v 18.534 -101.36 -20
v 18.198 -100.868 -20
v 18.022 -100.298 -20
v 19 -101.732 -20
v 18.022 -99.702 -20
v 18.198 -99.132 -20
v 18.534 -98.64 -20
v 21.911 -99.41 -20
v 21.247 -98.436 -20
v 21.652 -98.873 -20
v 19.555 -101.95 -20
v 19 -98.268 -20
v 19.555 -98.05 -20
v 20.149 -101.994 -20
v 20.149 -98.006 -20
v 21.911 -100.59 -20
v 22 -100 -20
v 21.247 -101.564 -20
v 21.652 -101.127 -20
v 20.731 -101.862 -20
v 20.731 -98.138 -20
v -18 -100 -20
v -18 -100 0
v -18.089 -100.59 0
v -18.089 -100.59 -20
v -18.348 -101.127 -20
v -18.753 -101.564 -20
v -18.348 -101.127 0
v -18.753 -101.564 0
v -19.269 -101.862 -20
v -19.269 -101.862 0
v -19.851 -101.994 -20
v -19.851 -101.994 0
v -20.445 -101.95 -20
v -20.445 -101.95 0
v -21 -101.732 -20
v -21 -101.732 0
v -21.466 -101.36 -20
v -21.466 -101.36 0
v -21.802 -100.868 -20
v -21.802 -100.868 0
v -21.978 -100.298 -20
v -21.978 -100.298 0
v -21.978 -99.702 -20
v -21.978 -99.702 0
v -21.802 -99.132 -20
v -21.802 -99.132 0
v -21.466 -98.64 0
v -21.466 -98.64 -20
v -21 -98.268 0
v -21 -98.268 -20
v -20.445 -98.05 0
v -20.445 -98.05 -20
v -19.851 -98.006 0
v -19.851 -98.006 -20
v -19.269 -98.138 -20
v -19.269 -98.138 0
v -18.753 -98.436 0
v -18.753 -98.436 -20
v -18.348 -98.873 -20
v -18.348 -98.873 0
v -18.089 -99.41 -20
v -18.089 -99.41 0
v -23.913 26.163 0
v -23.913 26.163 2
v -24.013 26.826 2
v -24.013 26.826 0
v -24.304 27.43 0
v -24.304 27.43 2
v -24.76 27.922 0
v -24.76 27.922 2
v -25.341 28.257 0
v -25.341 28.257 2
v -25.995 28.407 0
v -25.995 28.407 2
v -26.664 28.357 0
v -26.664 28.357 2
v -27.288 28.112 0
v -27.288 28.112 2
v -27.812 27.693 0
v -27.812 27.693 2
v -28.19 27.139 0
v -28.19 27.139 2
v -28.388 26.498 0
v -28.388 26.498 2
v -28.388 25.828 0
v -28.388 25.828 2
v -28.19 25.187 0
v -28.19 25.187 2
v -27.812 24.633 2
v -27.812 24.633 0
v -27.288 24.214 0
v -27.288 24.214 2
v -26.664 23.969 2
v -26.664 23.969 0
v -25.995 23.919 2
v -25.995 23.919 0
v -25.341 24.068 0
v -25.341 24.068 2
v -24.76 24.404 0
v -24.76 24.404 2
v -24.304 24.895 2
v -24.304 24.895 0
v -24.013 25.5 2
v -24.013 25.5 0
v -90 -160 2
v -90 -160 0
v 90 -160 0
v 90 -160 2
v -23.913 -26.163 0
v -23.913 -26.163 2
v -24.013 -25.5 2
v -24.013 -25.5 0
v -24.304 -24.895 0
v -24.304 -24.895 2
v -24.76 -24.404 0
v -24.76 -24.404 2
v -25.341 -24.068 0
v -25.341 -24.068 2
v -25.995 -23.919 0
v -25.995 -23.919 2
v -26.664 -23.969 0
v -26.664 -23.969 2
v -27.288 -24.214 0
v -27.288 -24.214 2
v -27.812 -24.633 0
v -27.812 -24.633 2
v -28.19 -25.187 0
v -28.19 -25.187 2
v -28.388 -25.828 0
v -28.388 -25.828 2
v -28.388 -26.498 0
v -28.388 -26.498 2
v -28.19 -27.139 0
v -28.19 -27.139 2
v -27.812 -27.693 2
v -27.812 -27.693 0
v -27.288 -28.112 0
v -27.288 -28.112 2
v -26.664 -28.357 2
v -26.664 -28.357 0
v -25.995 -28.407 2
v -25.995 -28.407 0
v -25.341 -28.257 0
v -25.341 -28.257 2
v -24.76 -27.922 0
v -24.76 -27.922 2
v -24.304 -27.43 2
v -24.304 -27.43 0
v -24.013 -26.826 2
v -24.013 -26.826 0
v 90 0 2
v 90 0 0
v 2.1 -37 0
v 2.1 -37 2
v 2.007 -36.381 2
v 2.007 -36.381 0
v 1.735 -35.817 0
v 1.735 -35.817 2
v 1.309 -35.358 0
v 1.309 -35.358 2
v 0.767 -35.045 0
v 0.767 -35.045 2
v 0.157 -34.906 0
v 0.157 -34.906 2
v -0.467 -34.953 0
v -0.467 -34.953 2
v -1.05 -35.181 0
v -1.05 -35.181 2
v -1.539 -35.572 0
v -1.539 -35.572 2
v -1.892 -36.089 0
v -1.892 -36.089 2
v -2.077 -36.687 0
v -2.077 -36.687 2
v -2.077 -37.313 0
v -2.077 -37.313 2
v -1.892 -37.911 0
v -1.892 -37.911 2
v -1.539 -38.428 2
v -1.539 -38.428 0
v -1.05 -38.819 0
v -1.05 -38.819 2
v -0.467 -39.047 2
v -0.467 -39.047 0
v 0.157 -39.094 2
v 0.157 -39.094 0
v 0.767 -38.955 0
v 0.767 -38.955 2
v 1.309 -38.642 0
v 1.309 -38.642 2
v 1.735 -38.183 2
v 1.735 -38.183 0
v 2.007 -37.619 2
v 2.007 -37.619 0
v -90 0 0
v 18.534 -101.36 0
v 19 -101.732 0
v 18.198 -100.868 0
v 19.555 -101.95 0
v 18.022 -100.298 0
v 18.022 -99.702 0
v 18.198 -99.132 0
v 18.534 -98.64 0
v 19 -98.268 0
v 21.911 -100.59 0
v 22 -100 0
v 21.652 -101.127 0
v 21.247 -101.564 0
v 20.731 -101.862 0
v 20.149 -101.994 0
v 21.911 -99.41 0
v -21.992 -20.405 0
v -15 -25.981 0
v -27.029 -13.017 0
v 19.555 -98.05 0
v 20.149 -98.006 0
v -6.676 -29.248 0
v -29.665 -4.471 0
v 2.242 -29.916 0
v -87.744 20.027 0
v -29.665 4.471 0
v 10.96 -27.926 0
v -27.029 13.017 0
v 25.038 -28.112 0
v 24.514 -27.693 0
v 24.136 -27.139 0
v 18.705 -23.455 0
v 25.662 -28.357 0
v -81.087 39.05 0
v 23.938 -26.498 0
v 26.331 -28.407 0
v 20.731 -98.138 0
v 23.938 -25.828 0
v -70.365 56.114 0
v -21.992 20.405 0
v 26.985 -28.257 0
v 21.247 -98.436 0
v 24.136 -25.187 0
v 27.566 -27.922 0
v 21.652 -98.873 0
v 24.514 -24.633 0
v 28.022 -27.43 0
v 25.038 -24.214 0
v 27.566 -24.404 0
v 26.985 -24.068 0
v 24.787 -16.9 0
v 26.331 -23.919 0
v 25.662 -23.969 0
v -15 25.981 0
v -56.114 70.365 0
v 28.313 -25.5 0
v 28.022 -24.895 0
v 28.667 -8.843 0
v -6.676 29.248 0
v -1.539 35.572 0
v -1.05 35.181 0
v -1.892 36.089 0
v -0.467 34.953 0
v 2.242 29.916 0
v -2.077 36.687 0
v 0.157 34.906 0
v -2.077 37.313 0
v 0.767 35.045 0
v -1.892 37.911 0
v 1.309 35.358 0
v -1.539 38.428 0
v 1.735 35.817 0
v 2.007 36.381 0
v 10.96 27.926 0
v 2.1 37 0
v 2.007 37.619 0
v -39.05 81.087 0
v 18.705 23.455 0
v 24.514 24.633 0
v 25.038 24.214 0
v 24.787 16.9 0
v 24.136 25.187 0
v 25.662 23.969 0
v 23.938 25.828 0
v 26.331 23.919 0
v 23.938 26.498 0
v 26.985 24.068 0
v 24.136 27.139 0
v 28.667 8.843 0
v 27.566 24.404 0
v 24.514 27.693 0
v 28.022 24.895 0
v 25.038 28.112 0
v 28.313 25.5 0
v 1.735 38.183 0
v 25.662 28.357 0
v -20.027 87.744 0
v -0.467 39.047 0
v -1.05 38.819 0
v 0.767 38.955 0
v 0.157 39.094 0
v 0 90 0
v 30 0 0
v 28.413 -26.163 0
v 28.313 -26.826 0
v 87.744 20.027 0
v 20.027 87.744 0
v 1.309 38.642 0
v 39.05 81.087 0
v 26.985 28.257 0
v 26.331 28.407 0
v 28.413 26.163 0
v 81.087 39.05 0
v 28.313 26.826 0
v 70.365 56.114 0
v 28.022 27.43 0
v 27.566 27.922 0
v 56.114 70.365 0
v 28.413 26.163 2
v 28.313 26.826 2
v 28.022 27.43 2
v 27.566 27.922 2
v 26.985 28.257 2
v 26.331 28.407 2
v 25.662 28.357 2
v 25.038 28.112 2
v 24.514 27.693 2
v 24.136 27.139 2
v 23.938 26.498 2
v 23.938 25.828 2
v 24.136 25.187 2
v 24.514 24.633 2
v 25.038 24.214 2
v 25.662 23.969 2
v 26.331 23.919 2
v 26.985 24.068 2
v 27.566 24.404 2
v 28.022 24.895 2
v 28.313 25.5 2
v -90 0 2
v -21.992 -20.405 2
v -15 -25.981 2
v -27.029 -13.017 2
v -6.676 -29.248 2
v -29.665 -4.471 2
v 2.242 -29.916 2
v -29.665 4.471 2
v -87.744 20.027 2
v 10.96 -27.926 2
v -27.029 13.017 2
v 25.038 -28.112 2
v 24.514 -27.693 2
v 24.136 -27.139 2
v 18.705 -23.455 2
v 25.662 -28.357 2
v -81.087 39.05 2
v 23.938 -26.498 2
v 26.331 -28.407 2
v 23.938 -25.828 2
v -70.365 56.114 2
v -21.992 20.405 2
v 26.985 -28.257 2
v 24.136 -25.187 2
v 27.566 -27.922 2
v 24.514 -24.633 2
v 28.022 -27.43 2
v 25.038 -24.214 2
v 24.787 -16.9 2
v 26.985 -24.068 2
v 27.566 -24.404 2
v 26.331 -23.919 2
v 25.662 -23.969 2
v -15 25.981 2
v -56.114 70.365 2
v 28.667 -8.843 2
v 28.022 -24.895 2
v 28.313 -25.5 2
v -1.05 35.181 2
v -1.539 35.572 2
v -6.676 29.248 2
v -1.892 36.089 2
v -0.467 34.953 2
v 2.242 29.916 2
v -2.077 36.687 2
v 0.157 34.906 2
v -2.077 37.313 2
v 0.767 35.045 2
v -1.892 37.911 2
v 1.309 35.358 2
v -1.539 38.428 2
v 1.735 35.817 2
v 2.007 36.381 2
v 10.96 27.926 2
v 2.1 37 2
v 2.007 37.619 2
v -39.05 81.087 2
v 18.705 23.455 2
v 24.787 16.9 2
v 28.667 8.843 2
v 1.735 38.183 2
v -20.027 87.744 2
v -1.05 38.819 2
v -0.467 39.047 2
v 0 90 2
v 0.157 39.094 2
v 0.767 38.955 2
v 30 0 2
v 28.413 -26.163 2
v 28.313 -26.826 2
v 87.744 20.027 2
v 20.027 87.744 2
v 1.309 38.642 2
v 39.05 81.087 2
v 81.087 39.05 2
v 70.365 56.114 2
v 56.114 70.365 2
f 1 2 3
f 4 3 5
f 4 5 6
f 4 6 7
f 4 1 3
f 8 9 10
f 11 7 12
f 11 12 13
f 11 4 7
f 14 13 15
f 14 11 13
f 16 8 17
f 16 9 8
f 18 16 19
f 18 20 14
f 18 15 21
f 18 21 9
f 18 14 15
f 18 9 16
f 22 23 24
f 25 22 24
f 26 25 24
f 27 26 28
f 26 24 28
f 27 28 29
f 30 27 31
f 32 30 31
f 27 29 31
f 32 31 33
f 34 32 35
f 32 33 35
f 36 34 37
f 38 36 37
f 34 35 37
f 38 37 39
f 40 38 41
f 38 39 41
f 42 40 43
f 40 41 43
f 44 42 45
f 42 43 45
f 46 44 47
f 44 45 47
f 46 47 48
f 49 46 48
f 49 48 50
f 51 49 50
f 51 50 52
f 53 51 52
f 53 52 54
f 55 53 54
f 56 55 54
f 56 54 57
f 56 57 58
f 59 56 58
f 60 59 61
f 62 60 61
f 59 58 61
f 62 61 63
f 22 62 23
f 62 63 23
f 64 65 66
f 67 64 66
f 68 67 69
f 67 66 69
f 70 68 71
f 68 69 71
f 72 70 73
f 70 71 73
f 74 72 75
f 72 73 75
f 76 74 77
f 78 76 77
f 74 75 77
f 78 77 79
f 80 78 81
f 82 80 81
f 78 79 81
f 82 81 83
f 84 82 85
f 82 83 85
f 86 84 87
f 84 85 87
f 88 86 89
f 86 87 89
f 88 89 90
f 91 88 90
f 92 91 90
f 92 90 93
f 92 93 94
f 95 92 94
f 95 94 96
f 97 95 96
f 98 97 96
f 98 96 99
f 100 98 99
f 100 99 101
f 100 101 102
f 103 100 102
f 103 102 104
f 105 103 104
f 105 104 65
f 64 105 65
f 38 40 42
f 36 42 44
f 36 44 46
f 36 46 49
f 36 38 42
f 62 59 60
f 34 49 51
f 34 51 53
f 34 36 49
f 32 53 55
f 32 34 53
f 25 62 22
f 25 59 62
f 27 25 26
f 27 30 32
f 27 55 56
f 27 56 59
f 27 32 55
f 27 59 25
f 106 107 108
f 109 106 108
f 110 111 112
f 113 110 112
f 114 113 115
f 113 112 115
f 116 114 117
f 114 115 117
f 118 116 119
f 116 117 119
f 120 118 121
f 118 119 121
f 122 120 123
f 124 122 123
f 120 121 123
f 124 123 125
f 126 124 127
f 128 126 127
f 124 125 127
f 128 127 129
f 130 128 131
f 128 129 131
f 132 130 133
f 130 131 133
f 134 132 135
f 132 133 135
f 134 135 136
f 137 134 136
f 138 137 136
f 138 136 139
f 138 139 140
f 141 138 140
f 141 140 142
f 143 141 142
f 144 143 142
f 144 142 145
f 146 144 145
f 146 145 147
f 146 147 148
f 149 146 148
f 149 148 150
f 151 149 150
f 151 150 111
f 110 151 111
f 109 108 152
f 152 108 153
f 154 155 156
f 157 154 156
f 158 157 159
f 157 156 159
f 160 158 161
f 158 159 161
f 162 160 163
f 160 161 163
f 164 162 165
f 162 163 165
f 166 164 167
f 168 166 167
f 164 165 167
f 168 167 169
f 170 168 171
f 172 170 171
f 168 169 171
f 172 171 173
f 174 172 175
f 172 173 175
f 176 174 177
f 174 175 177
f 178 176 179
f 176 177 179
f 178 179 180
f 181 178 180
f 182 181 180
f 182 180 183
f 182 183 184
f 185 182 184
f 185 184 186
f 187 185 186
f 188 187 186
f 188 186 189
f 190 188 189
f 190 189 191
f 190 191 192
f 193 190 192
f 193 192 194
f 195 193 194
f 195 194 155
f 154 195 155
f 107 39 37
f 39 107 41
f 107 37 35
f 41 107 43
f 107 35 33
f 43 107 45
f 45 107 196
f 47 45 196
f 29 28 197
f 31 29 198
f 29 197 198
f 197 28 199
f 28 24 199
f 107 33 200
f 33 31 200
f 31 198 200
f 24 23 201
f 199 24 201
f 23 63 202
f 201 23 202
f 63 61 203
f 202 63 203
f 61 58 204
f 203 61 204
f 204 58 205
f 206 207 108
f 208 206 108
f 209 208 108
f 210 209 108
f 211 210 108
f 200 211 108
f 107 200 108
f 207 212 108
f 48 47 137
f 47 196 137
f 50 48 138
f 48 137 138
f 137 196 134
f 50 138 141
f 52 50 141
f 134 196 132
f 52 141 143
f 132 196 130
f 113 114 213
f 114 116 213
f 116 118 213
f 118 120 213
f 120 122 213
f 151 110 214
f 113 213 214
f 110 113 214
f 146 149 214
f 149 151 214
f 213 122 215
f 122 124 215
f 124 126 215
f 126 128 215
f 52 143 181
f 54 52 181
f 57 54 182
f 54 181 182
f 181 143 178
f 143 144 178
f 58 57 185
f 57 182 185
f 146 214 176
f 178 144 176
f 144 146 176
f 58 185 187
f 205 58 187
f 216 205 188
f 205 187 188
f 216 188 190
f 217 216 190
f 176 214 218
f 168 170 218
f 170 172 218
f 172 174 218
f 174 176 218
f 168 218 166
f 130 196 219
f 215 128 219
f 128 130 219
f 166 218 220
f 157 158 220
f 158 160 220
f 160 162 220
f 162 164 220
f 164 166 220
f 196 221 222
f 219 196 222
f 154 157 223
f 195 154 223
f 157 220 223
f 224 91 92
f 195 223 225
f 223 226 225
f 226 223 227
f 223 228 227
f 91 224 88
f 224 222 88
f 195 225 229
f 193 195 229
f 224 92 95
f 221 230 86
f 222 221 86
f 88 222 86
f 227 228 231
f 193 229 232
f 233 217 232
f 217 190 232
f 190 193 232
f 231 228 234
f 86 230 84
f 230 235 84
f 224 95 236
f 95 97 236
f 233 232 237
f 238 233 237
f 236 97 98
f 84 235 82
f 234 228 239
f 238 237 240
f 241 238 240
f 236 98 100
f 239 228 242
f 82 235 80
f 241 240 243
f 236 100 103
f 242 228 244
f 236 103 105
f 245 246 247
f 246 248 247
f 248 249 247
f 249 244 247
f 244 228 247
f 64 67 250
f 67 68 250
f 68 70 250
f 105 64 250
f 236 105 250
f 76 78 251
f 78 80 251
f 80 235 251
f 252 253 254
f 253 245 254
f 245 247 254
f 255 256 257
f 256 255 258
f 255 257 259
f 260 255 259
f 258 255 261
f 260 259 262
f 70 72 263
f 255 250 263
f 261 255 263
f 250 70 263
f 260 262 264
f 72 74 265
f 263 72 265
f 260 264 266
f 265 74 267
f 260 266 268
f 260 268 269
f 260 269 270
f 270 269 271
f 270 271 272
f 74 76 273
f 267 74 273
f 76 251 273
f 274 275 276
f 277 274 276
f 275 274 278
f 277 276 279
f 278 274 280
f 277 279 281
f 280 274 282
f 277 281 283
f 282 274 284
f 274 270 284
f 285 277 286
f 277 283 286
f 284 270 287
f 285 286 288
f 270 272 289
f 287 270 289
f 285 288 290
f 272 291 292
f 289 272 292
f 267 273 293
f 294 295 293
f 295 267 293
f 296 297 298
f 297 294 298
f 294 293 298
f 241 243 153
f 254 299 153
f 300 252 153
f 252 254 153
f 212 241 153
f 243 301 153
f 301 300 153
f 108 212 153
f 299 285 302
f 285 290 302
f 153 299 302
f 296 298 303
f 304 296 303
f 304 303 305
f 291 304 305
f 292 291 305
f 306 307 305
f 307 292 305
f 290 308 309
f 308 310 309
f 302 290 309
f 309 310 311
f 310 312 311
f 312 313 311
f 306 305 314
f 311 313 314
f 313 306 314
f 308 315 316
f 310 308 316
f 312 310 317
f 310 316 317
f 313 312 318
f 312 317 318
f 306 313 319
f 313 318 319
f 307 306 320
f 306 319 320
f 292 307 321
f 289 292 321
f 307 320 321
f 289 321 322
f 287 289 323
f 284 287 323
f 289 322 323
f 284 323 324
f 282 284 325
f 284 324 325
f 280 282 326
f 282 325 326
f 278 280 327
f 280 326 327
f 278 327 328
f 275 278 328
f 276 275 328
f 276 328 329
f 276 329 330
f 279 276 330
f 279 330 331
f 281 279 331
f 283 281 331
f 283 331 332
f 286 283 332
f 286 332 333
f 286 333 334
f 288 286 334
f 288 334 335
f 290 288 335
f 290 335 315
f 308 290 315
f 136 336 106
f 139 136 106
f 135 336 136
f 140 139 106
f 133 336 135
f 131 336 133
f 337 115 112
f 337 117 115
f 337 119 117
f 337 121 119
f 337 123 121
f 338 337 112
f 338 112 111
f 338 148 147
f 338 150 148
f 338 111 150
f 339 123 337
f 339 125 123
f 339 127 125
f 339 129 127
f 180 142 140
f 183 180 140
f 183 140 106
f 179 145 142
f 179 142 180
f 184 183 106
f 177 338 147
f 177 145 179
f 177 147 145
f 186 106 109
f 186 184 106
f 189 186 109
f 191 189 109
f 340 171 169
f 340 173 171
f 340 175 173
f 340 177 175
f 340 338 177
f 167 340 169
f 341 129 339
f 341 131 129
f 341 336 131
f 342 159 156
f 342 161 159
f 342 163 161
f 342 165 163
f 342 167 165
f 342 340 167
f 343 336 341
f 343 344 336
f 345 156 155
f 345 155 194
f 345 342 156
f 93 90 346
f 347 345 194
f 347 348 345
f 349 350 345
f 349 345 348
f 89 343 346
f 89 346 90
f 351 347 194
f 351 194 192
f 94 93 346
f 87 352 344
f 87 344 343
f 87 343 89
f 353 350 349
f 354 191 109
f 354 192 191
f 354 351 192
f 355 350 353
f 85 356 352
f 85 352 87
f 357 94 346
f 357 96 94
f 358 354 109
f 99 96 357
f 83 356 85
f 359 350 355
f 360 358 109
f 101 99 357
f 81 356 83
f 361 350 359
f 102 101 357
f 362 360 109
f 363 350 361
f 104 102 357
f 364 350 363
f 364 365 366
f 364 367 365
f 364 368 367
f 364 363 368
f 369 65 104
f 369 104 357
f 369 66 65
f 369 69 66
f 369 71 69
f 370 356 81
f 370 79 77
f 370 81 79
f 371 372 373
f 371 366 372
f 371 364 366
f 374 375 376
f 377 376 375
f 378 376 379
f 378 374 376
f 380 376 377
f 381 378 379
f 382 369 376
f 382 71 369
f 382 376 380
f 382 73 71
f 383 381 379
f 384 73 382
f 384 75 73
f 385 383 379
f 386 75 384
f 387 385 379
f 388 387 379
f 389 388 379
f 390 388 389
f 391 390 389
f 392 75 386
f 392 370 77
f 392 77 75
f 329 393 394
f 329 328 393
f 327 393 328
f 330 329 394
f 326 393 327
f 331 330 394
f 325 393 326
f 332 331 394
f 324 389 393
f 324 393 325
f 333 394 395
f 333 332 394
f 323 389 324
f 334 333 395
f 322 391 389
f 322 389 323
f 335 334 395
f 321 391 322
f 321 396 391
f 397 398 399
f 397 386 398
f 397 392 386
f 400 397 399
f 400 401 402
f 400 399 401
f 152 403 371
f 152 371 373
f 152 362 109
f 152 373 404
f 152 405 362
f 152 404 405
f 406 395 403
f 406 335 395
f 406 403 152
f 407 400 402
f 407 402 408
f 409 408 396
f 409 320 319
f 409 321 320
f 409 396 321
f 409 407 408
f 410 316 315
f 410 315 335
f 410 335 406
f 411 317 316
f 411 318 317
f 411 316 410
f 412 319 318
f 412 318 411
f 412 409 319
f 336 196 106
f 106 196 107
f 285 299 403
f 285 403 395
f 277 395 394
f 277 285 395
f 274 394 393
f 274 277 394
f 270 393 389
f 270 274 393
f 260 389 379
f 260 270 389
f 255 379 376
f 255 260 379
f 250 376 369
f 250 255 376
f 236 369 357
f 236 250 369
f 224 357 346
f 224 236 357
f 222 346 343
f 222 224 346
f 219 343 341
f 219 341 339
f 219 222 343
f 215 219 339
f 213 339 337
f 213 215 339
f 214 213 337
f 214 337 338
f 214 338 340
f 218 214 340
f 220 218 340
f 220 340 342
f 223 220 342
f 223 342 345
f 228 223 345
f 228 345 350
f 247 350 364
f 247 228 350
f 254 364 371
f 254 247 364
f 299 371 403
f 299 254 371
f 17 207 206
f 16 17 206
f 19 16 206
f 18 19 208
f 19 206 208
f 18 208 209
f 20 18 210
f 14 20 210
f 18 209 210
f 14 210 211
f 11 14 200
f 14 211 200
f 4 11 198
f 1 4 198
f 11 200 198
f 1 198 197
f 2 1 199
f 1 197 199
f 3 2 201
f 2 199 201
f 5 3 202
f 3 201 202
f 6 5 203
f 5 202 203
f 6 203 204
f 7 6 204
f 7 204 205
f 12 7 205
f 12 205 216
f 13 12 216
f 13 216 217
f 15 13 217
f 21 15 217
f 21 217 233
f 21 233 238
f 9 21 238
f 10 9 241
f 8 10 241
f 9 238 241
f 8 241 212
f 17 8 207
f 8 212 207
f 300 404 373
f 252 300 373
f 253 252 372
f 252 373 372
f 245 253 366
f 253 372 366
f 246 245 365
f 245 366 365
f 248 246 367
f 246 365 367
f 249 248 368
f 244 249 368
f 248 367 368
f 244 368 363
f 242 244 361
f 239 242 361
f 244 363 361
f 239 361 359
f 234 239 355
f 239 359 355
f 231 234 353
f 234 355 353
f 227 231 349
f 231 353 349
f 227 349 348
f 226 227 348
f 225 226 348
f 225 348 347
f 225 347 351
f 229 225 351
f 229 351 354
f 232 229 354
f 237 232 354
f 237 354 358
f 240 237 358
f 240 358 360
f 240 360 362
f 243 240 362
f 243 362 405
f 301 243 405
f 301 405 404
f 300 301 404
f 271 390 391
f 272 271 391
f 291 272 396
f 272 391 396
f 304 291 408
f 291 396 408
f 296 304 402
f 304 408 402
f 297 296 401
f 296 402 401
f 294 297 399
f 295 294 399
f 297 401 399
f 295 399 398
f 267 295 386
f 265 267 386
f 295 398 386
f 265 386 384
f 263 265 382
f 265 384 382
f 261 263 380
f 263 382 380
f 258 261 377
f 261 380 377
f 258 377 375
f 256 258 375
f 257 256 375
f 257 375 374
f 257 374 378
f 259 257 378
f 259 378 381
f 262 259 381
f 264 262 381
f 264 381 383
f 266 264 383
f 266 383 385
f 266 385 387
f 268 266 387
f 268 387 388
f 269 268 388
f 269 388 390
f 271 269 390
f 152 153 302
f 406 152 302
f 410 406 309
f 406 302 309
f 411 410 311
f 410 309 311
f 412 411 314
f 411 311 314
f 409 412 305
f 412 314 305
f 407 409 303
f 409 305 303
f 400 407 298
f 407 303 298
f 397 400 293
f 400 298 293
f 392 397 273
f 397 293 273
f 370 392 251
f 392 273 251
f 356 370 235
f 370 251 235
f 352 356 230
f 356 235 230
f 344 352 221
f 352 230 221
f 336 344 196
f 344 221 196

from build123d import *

# Parameters (mm, degrees)
ESQUISSE1_R             = 30
BOSS_EXTRU_1_DEPTH      = 2
ENL_V_MAT_EXTRU_1_REACH = 185.586
ESQUISSE2_R             = 2.25
ESQUISSE2_R_2           = 2.1
ESQUISSE4_R             = 2
GOUJON_M4X20_DEPTH      = 20


with BuildPart() as part:
    # Esquisse1 → Boss.-Extru.1 (new body)
    with BuildSketch(Plane.XY):
        with BuildLine():
            Line((-90, -160), (90, -160))
            Line((90, -160), (90, 0))
            ThreePointArc((90, 0), (0, 90), (-90, 0))
            Line((-90, 0), (-90, -160))
        make_face()
        Circle(ESQUISSE1_R, mode=Mode.SUBTRACT)
    extrude(amount=BOSS_EXTRU_1_DEPTH)

    # Esquisse2 → Enlèv. mat.-Extru.1 (cut, up to next)
    with BuildSketch(Plane.XY.offset(2), mode=Mode.PRIVATE) as enl_v_mat_extru_1_sk1:
        with Locations((26.162950904, 26.162950904)):
            Circle(ESQUISSE2_R)
    enl_v_mat_extru_1_tool1 = extrude(enl_v_mat_extru_1_sk1.sketch, amount=-ENL_V_MAT_EXTRU_1_REACH, mode=Mode.PRIVATE) & part.part
    # Esquisse2 → Enlèv. mat.-Extru.1 (cut, up to next)
    with BuildSketch(Plane.XY.offset(2), mode=Mode.PRIVATE) as enl_v_mat_extru_1_sk2:
        with Locations((-26.162950904, -26.162950904)):
            Circle(ESQUISSE2_R)
    enl_v_mat_extru_1_tool2 = extrude(enl_v_mat_extru_1_sk2.sketch, amount=-ENL_V_MAT_EXTRU_1_REACH, mode=Mode.PRIVATE) & part.part
    # Esquisse2 → Enlèv. mat.-Extru.1 (cut, up to next)
    with BuildSketch(Plane.XY.offset(2), mode=Mode.PRIVATE) as enl_v_mat_extru_1_sk3:
        with Locations((-26.162950904, 26.162950904)):
            Circle(ESQUISSE2_R)
    enl_v_mat_extru_1_tool3 = extrude(enl_v_mat_extru_1_sk3.sketch, amount=-ENL_V_MAT_EXTRU_1_REACH, mode=Mode.PRIVATE) & part.part
    # Esquisse2 → Enlèv. mat.-Extru.1 (cut, up to next)
    with BuildSketch(Plane.XY.offset(2), mode=Mode.PRIVATE) as enl_v_mat_extru_1_sk4:
        with Locations((26.162950904, -26.162950904)):
            Circle(ESQUISSE2_R)
    enl_v_mat_extru_1_tool4 = extrude(enl_v_mat_extru_1_sk4.sketch, amount=-ENL_V_MAT_EXTRU_1_REACH, mode=Mode.PRIVATE) & part.part
    # Esquisse2 → Enlèv. mat.-Extru.1 (cut, up to next)
    with BuildSketch(Plane.XY.offset(2), mode=Mode.PRIVATE) as enl_v_mat_extru_1_sk5:
        with Locations((0, 37)):
            Circle(ESQUISSE2_R_2)
    enl_v_mat_extru_1_tool5 = extrude(enl_v_mat_extru_1_sk5.sketch, amount=-ENL_V_MAT_EXTRU_1_REACH, mode=Mode.PRIVATE) & part.part
    # Esquisse2 → Enlèv. mat.-Extru.1 (cut, up to next)
    with BuildSketch(Plane.XY.offset(2), mode=Mode.PRIVATE) as enl_v_mat_extru_1_sk6:
        with Locations((0, -37)):
            Circle(ESQUISSE2_R_2)
    enl_v_mat_extru_1_tool6 = extrude(enl_v_mat_extru_1_sk6.sketch, amount=-ENL_V_MAT_EXTRU_1_REACH, mode=Mode.PRIVATE) & part.part
    add(enl_v_mat_extru_1_tool1.solids().sort_by_distance((26.162951, 26.162951, 2))[0], mode=Mode.SUBTRACT)
    add(enl_v_mat_extru_1_tool2.solids().sort_by_distance((-26.162951, -26.162951, 2))[0], mode=Mode.SUBTRACT)
    add(enl_v_mat_extru_1_tool3.solids().sort_by_distance((-26.162951, 26.162951, 2))[0], mode=Mode.SUBTRACT)
    add(enl_v_mat_extru_1_tool4.solids().sort_by_distance((26.162951, -26.162951, 2))[0], mode=Mode.SUBTRACT)
    add(enl_v_mat_extru_1_tool5.solids().sort_by_distance((0, 37, 2))[0], mode=Mode.SUBTRACT)
    add(enl_v_mat_extru_1_tool6.solids().sort_by_distance((0, -37, 2))[0], mode=Mode.SUBTRACT)

    # Esquisse4 → Goujon M4x20 (add)
    with BuildSketch(Plane(origin=(0, 0, 0), x_dir=(-1, 0, 0), z_dir=(0, 0, -1))):
        with Locations((-20, -100)):
            Circle(ESQUISSE4_R)
        with Locations((20, -100)):
            Circle(ESQUISSE4_R)
    extrude(amount=GOUJON_M4X20_DEPTH)


solid = part.part
